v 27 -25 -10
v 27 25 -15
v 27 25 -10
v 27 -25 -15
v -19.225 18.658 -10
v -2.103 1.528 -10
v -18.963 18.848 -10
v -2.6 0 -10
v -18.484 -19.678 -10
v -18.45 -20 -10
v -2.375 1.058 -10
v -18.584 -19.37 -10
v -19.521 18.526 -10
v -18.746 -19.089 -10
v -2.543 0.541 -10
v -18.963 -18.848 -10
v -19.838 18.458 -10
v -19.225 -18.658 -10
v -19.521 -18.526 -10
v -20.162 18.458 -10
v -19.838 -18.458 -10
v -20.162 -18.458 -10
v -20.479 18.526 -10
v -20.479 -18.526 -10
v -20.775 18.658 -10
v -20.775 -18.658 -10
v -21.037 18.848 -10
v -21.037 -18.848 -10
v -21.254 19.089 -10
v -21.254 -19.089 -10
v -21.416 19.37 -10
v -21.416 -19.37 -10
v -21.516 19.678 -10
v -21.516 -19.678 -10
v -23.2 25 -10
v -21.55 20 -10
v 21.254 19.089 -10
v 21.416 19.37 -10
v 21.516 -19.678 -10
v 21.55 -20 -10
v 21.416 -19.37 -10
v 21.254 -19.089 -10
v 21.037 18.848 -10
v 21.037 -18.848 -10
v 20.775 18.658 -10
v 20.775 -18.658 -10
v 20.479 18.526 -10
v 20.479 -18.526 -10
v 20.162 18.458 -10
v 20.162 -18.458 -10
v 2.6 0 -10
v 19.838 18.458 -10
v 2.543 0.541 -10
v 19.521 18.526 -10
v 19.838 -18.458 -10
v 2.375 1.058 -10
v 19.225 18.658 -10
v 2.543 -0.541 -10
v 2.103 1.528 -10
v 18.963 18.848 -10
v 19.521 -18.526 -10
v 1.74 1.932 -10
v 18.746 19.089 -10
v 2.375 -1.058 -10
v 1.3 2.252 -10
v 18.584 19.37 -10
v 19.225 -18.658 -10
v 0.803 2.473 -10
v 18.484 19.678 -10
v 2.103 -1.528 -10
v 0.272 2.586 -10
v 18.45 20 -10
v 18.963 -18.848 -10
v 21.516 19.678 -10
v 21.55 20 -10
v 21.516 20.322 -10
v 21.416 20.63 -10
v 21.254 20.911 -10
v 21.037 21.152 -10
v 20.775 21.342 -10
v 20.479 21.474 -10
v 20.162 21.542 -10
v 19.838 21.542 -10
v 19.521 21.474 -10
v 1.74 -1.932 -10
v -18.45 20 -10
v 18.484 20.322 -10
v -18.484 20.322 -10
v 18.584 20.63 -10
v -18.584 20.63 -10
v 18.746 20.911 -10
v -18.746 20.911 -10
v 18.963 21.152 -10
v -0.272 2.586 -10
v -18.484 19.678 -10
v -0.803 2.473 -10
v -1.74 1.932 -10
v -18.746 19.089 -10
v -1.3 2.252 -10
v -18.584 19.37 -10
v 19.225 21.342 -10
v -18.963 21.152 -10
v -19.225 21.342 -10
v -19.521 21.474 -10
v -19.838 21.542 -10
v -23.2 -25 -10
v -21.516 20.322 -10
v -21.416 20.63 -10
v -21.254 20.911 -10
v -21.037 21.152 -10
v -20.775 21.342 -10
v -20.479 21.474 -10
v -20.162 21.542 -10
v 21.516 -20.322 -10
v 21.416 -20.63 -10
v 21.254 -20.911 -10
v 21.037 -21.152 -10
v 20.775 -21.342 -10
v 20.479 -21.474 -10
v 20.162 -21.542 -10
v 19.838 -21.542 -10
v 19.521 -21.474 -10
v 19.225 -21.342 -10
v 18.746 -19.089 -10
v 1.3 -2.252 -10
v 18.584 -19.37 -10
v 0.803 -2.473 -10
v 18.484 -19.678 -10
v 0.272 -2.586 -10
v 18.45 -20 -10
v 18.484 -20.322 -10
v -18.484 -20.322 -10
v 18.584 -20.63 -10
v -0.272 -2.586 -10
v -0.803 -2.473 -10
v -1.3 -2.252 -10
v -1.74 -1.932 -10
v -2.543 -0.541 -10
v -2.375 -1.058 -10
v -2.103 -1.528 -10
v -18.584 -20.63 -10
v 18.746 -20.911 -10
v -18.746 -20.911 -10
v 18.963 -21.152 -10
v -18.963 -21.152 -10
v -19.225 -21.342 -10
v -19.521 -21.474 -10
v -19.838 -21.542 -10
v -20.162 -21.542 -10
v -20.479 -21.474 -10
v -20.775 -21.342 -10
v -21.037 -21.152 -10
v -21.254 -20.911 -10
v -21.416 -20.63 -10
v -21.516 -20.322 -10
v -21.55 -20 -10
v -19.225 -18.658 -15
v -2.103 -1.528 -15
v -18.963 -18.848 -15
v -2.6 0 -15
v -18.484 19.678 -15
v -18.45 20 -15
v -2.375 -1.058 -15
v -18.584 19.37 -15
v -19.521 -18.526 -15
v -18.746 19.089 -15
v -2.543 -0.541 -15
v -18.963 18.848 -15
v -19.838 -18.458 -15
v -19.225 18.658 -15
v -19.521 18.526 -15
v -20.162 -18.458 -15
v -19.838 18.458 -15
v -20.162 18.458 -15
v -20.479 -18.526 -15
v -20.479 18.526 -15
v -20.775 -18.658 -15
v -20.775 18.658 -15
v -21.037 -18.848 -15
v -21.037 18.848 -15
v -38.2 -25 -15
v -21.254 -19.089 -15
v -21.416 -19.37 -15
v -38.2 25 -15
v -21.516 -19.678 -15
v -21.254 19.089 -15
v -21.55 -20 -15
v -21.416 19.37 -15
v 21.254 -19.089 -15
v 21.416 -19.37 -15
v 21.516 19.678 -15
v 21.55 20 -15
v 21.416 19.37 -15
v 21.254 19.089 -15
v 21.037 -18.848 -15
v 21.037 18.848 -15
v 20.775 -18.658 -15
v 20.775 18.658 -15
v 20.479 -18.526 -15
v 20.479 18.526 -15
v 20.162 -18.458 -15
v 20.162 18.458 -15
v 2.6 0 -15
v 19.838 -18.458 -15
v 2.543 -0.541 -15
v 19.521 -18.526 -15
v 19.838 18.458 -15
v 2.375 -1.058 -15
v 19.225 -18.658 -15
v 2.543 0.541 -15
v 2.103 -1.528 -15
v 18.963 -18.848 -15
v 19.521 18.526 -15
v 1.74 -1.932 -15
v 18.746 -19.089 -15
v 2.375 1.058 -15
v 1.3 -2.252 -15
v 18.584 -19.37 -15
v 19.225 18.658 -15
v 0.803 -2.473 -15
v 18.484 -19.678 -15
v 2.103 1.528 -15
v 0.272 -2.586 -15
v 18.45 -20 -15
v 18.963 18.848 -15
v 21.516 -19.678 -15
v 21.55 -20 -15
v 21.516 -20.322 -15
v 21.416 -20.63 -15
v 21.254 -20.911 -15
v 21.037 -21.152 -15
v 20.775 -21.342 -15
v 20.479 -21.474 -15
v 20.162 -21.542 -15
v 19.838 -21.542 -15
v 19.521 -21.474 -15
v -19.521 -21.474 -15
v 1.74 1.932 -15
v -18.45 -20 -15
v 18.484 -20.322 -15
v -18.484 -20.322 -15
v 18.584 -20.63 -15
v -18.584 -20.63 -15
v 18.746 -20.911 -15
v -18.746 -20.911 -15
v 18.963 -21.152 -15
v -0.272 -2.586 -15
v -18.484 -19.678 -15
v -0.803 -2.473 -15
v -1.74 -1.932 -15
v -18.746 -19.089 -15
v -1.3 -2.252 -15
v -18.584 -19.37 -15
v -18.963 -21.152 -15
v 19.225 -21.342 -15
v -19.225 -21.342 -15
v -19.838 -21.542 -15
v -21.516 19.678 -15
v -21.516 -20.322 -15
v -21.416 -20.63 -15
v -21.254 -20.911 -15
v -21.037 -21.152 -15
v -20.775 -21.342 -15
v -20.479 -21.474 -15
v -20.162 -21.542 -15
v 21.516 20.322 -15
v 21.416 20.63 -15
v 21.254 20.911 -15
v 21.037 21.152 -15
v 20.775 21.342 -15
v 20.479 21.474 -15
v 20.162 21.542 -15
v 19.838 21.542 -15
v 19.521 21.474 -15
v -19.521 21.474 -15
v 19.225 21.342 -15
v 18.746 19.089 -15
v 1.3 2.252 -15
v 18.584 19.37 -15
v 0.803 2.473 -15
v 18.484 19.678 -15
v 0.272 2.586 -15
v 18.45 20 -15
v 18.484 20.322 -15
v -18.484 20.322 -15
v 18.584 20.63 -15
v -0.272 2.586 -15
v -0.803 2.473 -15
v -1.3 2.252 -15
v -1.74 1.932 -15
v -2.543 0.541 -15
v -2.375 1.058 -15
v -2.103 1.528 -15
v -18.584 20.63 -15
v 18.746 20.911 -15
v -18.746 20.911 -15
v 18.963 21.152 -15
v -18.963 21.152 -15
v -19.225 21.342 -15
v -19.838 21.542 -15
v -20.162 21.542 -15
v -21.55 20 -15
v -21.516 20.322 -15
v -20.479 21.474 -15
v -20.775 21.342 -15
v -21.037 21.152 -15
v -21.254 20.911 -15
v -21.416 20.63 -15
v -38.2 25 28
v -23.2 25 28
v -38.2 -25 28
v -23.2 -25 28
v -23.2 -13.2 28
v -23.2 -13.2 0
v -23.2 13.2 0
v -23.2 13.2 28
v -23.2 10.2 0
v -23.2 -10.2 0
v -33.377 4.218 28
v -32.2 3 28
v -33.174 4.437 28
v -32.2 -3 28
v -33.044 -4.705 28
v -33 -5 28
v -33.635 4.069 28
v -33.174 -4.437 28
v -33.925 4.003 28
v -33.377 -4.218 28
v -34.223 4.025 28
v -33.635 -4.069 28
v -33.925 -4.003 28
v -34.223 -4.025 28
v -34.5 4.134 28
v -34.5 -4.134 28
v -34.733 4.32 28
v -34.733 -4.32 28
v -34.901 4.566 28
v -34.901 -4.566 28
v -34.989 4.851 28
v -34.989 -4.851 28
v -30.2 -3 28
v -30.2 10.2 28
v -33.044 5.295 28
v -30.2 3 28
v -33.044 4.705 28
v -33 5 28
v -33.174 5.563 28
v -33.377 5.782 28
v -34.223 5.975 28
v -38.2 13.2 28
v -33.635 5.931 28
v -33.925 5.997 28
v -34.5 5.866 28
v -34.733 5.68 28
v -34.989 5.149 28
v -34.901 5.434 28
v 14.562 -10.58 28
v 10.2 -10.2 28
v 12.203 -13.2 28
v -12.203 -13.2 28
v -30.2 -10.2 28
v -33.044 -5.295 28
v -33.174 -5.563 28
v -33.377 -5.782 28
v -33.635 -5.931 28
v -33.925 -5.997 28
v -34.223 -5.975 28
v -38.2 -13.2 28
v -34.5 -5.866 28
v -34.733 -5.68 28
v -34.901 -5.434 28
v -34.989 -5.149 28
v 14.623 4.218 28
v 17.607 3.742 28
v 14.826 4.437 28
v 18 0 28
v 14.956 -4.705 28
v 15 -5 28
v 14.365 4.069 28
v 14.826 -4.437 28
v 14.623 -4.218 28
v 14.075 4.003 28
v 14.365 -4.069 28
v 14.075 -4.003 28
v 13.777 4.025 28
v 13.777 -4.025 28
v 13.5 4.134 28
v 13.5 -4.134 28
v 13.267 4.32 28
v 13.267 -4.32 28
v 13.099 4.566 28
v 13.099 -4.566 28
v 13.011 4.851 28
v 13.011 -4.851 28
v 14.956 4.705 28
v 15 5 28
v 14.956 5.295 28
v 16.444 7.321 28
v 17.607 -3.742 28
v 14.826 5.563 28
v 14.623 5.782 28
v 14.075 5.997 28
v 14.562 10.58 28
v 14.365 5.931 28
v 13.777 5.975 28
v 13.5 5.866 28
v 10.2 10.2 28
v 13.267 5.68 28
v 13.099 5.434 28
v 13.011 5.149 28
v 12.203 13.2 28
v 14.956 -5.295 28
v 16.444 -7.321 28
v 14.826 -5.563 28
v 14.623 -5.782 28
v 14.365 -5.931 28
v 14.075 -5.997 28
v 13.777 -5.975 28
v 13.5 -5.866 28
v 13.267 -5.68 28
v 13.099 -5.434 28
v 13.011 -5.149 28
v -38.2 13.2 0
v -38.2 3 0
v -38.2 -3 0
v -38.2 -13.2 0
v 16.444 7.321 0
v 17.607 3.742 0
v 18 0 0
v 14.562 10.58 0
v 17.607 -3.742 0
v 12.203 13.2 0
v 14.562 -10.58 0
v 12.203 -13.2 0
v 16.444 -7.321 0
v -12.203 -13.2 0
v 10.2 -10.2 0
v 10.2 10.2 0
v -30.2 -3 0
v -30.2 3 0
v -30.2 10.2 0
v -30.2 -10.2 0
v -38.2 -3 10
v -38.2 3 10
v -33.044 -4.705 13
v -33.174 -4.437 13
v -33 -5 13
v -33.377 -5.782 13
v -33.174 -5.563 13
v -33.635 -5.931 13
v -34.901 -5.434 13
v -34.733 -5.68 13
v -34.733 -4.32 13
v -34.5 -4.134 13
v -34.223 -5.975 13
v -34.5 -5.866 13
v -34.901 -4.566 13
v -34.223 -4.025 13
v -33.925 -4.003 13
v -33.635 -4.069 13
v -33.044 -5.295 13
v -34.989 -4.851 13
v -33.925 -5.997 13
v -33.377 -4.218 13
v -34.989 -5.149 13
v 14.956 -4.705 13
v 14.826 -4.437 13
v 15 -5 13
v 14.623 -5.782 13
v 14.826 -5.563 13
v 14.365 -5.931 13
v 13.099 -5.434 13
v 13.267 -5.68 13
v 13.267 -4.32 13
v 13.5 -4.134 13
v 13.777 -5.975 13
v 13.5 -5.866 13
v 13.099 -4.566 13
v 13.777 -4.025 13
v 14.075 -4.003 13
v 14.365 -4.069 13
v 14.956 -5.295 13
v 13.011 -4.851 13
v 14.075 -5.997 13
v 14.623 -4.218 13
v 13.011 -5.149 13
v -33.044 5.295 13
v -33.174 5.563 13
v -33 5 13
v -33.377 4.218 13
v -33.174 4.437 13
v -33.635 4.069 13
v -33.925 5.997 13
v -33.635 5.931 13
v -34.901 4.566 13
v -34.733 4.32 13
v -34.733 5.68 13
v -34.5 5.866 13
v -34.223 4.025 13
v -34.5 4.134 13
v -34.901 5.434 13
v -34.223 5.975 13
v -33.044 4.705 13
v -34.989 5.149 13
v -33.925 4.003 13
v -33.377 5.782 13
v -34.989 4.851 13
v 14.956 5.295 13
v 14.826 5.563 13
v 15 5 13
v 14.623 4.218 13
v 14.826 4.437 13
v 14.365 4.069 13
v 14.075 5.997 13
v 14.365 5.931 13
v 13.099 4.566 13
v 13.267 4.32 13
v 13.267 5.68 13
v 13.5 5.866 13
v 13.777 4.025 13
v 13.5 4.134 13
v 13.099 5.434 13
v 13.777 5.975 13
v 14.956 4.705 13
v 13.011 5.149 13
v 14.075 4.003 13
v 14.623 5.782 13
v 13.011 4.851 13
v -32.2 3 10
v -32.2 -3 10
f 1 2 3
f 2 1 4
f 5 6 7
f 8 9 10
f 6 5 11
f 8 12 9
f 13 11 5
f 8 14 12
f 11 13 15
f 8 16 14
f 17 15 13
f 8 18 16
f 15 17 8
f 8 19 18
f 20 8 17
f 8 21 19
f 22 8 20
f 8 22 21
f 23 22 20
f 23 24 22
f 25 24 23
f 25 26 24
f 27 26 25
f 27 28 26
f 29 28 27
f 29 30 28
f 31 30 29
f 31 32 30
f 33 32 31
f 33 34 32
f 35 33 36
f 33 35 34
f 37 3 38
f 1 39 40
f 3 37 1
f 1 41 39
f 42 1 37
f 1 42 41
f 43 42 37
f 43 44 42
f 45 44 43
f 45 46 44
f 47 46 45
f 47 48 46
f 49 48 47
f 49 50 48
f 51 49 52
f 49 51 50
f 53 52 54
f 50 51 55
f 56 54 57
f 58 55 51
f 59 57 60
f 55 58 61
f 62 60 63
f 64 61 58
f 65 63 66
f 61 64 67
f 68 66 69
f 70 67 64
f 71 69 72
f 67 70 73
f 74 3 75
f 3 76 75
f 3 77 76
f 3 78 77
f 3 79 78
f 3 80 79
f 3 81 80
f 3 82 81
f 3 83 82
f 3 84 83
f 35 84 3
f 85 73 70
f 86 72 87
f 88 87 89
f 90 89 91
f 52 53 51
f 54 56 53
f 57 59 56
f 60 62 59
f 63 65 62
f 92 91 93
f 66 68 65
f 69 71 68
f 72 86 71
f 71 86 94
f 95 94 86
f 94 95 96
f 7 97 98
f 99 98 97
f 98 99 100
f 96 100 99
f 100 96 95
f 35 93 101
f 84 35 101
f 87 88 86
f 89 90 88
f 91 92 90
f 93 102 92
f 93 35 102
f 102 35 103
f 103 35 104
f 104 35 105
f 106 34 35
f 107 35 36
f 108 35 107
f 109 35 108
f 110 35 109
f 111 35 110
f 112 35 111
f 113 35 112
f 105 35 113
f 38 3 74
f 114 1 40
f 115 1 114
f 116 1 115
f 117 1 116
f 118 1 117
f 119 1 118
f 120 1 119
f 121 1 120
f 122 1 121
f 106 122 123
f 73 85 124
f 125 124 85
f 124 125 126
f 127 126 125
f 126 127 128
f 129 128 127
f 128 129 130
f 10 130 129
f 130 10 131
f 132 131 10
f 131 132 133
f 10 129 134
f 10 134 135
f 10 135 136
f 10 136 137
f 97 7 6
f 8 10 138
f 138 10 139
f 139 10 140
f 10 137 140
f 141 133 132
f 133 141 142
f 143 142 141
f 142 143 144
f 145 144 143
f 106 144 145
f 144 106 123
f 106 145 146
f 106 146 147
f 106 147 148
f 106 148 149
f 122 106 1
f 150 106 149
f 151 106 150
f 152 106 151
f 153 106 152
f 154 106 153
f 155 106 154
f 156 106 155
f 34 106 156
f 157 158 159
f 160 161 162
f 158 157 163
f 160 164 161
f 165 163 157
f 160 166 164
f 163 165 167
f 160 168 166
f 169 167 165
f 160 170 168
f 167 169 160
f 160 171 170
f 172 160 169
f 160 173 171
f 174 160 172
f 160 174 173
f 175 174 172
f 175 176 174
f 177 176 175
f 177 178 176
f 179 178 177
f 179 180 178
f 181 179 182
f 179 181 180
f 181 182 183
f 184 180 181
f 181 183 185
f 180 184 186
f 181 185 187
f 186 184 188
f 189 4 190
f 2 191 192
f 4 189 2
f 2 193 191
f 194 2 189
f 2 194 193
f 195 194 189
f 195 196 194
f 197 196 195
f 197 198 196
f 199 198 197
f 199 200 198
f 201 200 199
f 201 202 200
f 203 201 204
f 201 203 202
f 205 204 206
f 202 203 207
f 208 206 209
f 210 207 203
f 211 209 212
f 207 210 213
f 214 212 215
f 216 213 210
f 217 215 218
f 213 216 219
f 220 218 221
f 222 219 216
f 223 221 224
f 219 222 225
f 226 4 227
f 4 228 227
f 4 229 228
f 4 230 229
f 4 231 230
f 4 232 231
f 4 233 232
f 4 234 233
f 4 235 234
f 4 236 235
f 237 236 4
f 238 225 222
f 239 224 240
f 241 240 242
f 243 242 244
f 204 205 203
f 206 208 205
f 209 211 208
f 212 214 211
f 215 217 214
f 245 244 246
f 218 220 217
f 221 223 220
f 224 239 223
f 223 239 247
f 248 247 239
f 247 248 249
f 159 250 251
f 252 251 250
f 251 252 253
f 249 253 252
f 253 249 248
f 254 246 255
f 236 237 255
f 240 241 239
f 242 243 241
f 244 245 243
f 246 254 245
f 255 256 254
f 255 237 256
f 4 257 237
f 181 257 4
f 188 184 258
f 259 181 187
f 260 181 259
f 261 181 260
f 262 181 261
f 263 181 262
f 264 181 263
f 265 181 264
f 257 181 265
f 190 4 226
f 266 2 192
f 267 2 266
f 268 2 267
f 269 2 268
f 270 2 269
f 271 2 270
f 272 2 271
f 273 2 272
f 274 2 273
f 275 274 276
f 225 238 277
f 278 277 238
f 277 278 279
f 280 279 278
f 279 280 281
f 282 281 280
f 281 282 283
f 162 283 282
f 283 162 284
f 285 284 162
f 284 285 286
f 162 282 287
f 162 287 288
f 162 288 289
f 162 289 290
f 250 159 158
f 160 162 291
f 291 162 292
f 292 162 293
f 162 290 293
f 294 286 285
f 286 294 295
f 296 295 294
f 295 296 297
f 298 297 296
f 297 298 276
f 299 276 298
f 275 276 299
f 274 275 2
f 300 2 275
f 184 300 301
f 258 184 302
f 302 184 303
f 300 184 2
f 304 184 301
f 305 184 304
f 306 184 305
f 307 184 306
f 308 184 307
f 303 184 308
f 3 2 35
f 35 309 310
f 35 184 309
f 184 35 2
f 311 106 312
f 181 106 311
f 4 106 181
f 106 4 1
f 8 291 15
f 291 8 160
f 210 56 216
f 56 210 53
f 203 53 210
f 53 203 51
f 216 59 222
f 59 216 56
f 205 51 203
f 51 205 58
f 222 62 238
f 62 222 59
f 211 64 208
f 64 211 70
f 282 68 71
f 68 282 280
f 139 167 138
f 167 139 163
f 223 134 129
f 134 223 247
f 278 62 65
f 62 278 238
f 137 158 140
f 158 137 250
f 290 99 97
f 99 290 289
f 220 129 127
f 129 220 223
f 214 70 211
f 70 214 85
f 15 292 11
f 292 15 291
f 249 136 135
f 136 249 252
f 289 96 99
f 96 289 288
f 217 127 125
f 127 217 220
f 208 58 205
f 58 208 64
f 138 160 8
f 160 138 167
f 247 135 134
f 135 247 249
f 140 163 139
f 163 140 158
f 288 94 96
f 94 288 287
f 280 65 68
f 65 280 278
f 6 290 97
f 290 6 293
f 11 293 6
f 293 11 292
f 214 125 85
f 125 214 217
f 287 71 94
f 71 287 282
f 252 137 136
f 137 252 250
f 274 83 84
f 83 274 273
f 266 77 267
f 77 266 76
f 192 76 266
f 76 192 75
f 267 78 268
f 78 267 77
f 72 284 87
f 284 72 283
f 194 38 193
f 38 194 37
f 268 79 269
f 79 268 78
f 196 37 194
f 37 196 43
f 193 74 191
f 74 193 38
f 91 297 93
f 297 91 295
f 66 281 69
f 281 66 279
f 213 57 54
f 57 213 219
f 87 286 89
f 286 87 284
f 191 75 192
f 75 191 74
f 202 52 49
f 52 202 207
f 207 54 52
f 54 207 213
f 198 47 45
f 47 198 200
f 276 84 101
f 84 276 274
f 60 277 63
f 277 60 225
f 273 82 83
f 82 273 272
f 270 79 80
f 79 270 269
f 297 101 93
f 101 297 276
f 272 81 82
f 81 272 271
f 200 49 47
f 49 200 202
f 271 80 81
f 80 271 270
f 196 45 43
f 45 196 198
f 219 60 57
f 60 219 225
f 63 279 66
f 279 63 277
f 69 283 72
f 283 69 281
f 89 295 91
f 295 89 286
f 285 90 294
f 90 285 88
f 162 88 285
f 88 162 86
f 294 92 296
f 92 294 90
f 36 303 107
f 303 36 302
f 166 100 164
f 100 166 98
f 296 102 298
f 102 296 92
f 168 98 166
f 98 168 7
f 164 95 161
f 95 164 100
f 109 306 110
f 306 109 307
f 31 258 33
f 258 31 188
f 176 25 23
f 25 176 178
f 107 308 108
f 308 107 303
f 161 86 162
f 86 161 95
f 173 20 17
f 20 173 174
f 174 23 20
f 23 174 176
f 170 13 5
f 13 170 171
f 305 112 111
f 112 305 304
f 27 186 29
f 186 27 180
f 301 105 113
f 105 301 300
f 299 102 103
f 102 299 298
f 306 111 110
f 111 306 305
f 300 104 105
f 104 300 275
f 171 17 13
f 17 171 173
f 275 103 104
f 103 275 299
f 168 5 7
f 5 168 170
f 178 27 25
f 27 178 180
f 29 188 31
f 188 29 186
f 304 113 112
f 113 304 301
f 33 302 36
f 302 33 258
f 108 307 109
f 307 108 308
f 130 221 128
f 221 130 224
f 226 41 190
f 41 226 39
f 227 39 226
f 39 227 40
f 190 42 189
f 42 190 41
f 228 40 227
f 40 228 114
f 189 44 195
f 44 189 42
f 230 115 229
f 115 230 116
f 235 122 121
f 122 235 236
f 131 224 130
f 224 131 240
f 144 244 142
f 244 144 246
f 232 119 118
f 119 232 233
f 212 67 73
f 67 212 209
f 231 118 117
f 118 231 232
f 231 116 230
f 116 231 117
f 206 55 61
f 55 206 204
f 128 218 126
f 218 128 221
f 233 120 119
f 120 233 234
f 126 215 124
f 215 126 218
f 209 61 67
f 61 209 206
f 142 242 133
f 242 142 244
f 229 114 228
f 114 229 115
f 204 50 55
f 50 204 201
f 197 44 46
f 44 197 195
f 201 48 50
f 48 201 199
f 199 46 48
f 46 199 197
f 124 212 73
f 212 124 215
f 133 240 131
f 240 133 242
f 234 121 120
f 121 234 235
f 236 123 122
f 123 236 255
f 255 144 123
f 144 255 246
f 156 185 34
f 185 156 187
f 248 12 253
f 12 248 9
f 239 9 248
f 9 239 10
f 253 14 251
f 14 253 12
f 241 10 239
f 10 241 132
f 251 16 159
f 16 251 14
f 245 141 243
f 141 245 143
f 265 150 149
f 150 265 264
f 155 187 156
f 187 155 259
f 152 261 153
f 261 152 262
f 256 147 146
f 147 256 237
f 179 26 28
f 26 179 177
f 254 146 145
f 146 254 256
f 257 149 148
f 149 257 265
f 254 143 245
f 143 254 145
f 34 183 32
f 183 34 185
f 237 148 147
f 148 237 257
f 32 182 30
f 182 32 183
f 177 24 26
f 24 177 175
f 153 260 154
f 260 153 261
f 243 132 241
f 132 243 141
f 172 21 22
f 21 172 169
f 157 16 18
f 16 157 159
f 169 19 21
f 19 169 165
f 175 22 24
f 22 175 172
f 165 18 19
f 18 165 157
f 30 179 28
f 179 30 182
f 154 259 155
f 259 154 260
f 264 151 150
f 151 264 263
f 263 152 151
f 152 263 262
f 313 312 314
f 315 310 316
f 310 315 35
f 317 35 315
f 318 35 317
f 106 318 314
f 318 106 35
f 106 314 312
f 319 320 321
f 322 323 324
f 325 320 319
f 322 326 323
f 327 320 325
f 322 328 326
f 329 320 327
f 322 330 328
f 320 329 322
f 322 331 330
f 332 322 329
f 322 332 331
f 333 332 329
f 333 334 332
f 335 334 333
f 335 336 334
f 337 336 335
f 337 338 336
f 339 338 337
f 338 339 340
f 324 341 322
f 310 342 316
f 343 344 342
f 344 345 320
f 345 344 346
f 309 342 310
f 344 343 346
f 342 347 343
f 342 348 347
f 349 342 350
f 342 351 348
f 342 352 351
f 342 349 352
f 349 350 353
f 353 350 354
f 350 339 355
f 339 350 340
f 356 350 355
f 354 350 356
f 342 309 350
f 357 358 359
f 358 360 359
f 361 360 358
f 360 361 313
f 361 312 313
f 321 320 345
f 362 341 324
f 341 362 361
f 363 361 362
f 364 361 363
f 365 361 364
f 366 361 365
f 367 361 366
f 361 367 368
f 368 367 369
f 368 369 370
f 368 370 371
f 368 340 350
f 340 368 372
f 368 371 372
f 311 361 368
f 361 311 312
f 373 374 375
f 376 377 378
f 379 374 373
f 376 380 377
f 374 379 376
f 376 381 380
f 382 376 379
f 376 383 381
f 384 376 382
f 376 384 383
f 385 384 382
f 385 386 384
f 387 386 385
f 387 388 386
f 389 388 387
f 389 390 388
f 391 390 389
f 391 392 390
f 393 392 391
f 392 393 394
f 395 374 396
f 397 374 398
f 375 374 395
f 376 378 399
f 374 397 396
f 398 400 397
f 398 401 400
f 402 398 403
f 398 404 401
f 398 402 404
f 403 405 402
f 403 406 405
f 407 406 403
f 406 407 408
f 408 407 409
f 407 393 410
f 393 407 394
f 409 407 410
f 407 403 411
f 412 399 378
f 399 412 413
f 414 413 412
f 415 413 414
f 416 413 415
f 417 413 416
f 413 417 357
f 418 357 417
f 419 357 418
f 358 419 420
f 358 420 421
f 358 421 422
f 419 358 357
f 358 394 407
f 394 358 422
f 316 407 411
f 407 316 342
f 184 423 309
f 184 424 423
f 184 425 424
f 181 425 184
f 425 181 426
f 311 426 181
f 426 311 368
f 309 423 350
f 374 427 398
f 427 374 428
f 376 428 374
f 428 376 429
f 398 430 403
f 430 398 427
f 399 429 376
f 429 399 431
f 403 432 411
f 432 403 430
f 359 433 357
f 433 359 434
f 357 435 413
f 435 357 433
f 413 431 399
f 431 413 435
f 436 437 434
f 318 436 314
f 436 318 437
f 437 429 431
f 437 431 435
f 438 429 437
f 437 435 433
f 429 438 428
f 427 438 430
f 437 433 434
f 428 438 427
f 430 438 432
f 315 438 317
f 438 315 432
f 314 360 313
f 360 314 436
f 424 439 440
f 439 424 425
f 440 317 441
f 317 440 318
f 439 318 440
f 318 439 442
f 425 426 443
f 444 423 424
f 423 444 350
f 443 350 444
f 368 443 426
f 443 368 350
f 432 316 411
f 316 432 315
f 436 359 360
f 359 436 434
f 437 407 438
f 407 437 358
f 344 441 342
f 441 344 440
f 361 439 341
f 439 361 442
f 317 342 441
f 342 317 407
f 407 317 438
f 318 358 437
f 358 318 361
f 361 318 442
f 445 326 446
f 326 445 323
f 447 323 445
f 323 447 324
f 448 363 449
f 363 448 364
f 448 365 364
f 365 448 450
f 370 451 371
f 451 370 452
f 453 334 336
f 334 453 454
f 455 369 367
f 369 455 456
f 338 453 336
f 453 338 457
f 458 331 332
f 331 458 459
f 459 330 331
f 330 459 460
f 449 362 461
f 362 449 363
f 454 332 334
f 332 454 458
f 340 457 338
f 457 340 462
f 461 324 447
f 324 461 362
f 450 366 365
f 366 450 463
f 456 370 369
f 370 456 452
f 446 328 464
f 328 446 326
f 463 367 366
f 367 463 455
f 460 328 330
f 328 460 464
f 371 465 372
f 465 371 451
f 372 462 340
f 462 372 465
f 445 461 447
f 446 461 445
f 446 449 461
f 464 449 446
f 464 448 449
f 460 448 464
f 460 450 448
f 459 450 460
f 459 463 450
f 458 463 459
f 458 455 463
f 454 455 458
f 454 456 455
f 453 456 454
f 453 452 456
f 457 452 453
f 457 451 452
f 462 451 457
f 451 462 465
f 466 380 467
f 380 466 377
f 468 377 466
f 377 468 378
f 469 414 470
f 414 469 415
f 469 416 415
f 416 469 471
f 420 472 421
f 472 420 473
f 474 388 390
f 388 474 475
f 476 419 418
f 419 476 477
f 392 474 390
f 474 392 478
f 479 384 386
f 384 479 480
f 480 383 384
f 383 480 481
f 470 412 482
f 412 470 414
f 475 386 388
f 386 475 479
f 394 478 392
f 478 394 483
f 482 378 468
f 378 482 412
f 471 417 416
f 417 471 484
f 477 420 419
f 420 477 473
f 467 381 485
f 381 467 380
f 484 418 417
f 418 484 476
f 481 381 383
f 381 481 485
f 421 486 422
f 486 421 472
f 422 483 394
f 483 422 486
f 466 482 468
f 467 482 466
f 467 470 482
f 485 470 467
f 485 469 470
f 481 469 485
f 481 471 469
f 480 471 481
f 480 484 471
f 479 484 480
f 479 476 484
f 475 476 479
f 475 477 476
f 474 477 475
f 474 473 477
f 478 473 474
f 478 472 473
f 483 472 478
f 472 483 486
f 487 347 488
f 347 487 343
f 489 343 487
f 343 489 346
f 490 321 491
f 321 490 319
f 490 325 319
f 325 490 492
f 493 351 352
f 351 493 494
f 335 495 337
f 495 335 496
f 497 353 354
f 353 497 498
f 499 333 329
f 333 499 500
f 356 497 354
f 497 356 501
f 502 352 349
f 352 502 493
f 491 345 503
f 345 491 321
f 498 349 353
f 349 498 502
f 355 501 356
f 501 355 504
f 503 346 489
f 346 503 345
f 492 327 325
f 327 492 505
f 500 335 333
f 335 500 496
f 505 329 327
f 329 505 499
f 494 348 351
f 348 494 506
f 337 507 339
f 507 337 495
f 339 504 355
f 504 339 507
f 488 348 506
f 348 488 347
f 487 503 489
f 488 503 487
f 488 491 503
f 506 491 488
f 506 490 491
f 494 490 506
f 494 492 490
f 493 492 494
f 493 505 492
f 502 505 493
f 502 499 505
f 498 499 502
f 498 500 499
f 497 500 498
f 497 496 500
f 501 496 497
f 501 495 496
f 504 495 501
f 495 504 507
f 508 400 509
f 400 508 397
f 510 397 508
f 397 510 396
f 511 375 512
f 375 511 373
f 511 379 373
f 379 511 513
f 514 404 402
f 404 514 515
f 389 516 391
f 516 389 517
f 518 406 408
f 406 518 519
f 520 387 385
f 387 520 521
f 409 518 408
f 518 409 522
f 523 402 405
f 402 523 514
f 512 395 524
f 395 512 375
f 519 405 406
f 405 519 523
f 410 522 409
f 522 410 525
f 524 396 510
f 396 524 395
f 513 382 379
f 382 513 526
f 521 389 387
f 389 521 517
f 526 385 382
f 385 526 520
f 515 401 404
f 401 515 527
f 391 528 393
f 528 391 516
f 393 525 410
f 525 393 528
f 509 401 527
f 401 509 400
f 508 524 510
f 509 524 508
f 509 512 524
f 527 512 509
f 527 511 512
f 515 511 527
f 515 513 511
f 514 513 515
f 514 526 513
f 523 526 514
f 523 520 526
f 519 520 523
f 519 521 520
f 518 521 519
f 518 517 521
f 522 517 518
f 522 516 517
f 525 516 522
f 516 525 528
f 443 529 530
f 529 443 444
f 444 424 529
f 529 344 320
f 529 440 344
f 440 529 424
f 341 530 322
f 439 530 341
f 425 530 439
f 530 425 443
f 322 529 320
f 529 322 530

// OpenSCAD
$fs = 0.3;

module arm_base(servo_length = 40.4, 
                servo_width = 20.4, 
                length_to_rot_center = 30.2,
                hole_lengh = 48,
                hole_width = 10,
                hole_d = 2,
                hole_h = 15,
                screw_holder_size_width = 8,
                side_thickness = 3,
                servo_lower_height = 28,
                bottom_thickness = 0,
                cable_hole_w = 6,
                cable_hole_h = 10,
                cable_hole_z_offset = 0,
                cable_shaft_depth=2,
                base_width = 50,
                base_length = 54,
                base_thick = 5,
                ower_axis_d = 5,
                roational_inner_r = 18,
                base_holder_width = 15,
                space_hight = 56,
                servo_mount_top_height = 18,
                base_hole_d = 3.1,
                base_hole_center_dist = 20
                ) {
    rot_c_offeset_x = screw_holder_size_width + length_to_rot_center;
    rot_c_offeset_y = side_thickness + servo_width / 2;
    base_offset_neg = -space_hight + servo_mount_top_height + servo_lower_height + bottom_thickness;
    echo("base_offset_neg ", base_offset_neg);       
    intersection() {
        union() {
            cylinder(h = servo_lower_height + bottom_thickness, r =             roational_inner_r); 
            translate([-servo_length, -side_thickness-servo_width/2], 0)
                cube([servo_length, servo_width + 2*side_thickness, servo_lower_height + bottom_thickness]);
            translate([0, 0, base_offset_neg-base_thick/2]) {
                difference() {
                    cube([base_length, base_width, base_thick], center = true);
                    cylinder(h = base_thick, d = ower_axis_d+0.2, center = true); // TODO bearing
                    
                    translate([base_hole_center_dist, base_hole_center_dist, 0])
                        cylinder(h = base_thick, d = base_hole_d, center = true);
                    translate([-base_hole_center_dist, base_hole_center_dist, 0])
                        cylinder(h = base_thick, d = base_hole_d, center = true);
                    translate([base_hole_center_dist, -base_hole_center_dist, 0])
                        cylinder(h = base_thick, d = base_hole_d, center = true);
                    translate([-base_hole_center_dist, -base_hole_center_dist, 0])
                        cylinder(h = base_thick, d = base_hole_d, center = true);
                }
                translate([-length_to_rot_center-screw_holder_size_width, -base_width/2, -base_thick/2])
                    cube([base_holder_width, base_width, base_thick - base_offset_neg + servo_lower_height], center = false);
            }
        }
        
        translate([-rot_c_offeset_x, -rot_c_offeset_y, 0]) {
            // servo holder box
            difference() {
                union() {
                    // outer box
                    cube([servo_length + 2*screw_holder_size_width, servo_width + 2*side_thickness, servo_lower_height + bottom_thickness]);
                    translate([rot_c_offeset_x, rot_c_offeset_y, 0])
                        translate([0, 0, base_offset_neg-base_thick/2]) {
                            difference() {
                                cube([base_length, base_width, base_thick], center = true);
                                cylinder(h = base_thick, d = ower_axis_d+0.2, center = true); // TODO bearing
                            }
                            translate([-length_to_rot_center-screw_holder_size_width, -base_width/2, -base_thick/2]) {
                                cube([base_holder_width, base_width, base_thick - base_offset_neg + servo_lower_height], center = false);
                            }
                        }
                }
                // inner servo space
                translate([screw_holder_size_width, side_thickness, bottom_thickness])
                    cube([servo_length, servo_width, servo_lower_height]);
                
                hole_x_offset = screw_holder_size_width - (hole_lengh-servo_length)/2;
                hole_y_offset = side_thickness + (servo_width - hole_width)/2;
                hole_z_offset = bottom_thickness + servo_lower_height - hole_h;
                
                // 4 holes
                translate([hole_x_offset, hole_y_offset, hole_z_offset])
                    cylinder(d = hole_d, h = hole_h);
                
                translate([hole_x_offset + hole_lengh, hole_y_offset, hole_z_offset])
                    cylinder(d = hole_d, h = hole_h);
                
                translate([hole_x_offset, hole_y_offset + hole_width, hole_z_offset])
                    cylinder(d = hole_d, h = hole_h);
                
                translate([hole_x_offset + hole_lengh, hole_y_offset + hole_width, hole_z_offset])
                    cylinder(d = hole_d, h = hole_h);
                
                // cable opening
                translate([0, side_thickness + (servo_width - cable_hole_w)/2, cable_hole_z_offset + bottom_thickness])
                    cube([screw_holder_size_width, cable_hole_w, cable_hole_h]);
                // cable shaft
                translate([screw_holder_size_width-cable_shaft_depth, side_thickness + (servo_width - cable_hole_w)/2, bottom_thickness])
                    cube([cable_shaft_depth, cable_hole_w, servo_lower_height]);
            }
            
            rot_c_offeset_x = screw_holder_size_width + length_to_rot_center;
            rot_c_offeset_y = side_thickness + servo_width / 2;
        }
    }
}

arm_base();
